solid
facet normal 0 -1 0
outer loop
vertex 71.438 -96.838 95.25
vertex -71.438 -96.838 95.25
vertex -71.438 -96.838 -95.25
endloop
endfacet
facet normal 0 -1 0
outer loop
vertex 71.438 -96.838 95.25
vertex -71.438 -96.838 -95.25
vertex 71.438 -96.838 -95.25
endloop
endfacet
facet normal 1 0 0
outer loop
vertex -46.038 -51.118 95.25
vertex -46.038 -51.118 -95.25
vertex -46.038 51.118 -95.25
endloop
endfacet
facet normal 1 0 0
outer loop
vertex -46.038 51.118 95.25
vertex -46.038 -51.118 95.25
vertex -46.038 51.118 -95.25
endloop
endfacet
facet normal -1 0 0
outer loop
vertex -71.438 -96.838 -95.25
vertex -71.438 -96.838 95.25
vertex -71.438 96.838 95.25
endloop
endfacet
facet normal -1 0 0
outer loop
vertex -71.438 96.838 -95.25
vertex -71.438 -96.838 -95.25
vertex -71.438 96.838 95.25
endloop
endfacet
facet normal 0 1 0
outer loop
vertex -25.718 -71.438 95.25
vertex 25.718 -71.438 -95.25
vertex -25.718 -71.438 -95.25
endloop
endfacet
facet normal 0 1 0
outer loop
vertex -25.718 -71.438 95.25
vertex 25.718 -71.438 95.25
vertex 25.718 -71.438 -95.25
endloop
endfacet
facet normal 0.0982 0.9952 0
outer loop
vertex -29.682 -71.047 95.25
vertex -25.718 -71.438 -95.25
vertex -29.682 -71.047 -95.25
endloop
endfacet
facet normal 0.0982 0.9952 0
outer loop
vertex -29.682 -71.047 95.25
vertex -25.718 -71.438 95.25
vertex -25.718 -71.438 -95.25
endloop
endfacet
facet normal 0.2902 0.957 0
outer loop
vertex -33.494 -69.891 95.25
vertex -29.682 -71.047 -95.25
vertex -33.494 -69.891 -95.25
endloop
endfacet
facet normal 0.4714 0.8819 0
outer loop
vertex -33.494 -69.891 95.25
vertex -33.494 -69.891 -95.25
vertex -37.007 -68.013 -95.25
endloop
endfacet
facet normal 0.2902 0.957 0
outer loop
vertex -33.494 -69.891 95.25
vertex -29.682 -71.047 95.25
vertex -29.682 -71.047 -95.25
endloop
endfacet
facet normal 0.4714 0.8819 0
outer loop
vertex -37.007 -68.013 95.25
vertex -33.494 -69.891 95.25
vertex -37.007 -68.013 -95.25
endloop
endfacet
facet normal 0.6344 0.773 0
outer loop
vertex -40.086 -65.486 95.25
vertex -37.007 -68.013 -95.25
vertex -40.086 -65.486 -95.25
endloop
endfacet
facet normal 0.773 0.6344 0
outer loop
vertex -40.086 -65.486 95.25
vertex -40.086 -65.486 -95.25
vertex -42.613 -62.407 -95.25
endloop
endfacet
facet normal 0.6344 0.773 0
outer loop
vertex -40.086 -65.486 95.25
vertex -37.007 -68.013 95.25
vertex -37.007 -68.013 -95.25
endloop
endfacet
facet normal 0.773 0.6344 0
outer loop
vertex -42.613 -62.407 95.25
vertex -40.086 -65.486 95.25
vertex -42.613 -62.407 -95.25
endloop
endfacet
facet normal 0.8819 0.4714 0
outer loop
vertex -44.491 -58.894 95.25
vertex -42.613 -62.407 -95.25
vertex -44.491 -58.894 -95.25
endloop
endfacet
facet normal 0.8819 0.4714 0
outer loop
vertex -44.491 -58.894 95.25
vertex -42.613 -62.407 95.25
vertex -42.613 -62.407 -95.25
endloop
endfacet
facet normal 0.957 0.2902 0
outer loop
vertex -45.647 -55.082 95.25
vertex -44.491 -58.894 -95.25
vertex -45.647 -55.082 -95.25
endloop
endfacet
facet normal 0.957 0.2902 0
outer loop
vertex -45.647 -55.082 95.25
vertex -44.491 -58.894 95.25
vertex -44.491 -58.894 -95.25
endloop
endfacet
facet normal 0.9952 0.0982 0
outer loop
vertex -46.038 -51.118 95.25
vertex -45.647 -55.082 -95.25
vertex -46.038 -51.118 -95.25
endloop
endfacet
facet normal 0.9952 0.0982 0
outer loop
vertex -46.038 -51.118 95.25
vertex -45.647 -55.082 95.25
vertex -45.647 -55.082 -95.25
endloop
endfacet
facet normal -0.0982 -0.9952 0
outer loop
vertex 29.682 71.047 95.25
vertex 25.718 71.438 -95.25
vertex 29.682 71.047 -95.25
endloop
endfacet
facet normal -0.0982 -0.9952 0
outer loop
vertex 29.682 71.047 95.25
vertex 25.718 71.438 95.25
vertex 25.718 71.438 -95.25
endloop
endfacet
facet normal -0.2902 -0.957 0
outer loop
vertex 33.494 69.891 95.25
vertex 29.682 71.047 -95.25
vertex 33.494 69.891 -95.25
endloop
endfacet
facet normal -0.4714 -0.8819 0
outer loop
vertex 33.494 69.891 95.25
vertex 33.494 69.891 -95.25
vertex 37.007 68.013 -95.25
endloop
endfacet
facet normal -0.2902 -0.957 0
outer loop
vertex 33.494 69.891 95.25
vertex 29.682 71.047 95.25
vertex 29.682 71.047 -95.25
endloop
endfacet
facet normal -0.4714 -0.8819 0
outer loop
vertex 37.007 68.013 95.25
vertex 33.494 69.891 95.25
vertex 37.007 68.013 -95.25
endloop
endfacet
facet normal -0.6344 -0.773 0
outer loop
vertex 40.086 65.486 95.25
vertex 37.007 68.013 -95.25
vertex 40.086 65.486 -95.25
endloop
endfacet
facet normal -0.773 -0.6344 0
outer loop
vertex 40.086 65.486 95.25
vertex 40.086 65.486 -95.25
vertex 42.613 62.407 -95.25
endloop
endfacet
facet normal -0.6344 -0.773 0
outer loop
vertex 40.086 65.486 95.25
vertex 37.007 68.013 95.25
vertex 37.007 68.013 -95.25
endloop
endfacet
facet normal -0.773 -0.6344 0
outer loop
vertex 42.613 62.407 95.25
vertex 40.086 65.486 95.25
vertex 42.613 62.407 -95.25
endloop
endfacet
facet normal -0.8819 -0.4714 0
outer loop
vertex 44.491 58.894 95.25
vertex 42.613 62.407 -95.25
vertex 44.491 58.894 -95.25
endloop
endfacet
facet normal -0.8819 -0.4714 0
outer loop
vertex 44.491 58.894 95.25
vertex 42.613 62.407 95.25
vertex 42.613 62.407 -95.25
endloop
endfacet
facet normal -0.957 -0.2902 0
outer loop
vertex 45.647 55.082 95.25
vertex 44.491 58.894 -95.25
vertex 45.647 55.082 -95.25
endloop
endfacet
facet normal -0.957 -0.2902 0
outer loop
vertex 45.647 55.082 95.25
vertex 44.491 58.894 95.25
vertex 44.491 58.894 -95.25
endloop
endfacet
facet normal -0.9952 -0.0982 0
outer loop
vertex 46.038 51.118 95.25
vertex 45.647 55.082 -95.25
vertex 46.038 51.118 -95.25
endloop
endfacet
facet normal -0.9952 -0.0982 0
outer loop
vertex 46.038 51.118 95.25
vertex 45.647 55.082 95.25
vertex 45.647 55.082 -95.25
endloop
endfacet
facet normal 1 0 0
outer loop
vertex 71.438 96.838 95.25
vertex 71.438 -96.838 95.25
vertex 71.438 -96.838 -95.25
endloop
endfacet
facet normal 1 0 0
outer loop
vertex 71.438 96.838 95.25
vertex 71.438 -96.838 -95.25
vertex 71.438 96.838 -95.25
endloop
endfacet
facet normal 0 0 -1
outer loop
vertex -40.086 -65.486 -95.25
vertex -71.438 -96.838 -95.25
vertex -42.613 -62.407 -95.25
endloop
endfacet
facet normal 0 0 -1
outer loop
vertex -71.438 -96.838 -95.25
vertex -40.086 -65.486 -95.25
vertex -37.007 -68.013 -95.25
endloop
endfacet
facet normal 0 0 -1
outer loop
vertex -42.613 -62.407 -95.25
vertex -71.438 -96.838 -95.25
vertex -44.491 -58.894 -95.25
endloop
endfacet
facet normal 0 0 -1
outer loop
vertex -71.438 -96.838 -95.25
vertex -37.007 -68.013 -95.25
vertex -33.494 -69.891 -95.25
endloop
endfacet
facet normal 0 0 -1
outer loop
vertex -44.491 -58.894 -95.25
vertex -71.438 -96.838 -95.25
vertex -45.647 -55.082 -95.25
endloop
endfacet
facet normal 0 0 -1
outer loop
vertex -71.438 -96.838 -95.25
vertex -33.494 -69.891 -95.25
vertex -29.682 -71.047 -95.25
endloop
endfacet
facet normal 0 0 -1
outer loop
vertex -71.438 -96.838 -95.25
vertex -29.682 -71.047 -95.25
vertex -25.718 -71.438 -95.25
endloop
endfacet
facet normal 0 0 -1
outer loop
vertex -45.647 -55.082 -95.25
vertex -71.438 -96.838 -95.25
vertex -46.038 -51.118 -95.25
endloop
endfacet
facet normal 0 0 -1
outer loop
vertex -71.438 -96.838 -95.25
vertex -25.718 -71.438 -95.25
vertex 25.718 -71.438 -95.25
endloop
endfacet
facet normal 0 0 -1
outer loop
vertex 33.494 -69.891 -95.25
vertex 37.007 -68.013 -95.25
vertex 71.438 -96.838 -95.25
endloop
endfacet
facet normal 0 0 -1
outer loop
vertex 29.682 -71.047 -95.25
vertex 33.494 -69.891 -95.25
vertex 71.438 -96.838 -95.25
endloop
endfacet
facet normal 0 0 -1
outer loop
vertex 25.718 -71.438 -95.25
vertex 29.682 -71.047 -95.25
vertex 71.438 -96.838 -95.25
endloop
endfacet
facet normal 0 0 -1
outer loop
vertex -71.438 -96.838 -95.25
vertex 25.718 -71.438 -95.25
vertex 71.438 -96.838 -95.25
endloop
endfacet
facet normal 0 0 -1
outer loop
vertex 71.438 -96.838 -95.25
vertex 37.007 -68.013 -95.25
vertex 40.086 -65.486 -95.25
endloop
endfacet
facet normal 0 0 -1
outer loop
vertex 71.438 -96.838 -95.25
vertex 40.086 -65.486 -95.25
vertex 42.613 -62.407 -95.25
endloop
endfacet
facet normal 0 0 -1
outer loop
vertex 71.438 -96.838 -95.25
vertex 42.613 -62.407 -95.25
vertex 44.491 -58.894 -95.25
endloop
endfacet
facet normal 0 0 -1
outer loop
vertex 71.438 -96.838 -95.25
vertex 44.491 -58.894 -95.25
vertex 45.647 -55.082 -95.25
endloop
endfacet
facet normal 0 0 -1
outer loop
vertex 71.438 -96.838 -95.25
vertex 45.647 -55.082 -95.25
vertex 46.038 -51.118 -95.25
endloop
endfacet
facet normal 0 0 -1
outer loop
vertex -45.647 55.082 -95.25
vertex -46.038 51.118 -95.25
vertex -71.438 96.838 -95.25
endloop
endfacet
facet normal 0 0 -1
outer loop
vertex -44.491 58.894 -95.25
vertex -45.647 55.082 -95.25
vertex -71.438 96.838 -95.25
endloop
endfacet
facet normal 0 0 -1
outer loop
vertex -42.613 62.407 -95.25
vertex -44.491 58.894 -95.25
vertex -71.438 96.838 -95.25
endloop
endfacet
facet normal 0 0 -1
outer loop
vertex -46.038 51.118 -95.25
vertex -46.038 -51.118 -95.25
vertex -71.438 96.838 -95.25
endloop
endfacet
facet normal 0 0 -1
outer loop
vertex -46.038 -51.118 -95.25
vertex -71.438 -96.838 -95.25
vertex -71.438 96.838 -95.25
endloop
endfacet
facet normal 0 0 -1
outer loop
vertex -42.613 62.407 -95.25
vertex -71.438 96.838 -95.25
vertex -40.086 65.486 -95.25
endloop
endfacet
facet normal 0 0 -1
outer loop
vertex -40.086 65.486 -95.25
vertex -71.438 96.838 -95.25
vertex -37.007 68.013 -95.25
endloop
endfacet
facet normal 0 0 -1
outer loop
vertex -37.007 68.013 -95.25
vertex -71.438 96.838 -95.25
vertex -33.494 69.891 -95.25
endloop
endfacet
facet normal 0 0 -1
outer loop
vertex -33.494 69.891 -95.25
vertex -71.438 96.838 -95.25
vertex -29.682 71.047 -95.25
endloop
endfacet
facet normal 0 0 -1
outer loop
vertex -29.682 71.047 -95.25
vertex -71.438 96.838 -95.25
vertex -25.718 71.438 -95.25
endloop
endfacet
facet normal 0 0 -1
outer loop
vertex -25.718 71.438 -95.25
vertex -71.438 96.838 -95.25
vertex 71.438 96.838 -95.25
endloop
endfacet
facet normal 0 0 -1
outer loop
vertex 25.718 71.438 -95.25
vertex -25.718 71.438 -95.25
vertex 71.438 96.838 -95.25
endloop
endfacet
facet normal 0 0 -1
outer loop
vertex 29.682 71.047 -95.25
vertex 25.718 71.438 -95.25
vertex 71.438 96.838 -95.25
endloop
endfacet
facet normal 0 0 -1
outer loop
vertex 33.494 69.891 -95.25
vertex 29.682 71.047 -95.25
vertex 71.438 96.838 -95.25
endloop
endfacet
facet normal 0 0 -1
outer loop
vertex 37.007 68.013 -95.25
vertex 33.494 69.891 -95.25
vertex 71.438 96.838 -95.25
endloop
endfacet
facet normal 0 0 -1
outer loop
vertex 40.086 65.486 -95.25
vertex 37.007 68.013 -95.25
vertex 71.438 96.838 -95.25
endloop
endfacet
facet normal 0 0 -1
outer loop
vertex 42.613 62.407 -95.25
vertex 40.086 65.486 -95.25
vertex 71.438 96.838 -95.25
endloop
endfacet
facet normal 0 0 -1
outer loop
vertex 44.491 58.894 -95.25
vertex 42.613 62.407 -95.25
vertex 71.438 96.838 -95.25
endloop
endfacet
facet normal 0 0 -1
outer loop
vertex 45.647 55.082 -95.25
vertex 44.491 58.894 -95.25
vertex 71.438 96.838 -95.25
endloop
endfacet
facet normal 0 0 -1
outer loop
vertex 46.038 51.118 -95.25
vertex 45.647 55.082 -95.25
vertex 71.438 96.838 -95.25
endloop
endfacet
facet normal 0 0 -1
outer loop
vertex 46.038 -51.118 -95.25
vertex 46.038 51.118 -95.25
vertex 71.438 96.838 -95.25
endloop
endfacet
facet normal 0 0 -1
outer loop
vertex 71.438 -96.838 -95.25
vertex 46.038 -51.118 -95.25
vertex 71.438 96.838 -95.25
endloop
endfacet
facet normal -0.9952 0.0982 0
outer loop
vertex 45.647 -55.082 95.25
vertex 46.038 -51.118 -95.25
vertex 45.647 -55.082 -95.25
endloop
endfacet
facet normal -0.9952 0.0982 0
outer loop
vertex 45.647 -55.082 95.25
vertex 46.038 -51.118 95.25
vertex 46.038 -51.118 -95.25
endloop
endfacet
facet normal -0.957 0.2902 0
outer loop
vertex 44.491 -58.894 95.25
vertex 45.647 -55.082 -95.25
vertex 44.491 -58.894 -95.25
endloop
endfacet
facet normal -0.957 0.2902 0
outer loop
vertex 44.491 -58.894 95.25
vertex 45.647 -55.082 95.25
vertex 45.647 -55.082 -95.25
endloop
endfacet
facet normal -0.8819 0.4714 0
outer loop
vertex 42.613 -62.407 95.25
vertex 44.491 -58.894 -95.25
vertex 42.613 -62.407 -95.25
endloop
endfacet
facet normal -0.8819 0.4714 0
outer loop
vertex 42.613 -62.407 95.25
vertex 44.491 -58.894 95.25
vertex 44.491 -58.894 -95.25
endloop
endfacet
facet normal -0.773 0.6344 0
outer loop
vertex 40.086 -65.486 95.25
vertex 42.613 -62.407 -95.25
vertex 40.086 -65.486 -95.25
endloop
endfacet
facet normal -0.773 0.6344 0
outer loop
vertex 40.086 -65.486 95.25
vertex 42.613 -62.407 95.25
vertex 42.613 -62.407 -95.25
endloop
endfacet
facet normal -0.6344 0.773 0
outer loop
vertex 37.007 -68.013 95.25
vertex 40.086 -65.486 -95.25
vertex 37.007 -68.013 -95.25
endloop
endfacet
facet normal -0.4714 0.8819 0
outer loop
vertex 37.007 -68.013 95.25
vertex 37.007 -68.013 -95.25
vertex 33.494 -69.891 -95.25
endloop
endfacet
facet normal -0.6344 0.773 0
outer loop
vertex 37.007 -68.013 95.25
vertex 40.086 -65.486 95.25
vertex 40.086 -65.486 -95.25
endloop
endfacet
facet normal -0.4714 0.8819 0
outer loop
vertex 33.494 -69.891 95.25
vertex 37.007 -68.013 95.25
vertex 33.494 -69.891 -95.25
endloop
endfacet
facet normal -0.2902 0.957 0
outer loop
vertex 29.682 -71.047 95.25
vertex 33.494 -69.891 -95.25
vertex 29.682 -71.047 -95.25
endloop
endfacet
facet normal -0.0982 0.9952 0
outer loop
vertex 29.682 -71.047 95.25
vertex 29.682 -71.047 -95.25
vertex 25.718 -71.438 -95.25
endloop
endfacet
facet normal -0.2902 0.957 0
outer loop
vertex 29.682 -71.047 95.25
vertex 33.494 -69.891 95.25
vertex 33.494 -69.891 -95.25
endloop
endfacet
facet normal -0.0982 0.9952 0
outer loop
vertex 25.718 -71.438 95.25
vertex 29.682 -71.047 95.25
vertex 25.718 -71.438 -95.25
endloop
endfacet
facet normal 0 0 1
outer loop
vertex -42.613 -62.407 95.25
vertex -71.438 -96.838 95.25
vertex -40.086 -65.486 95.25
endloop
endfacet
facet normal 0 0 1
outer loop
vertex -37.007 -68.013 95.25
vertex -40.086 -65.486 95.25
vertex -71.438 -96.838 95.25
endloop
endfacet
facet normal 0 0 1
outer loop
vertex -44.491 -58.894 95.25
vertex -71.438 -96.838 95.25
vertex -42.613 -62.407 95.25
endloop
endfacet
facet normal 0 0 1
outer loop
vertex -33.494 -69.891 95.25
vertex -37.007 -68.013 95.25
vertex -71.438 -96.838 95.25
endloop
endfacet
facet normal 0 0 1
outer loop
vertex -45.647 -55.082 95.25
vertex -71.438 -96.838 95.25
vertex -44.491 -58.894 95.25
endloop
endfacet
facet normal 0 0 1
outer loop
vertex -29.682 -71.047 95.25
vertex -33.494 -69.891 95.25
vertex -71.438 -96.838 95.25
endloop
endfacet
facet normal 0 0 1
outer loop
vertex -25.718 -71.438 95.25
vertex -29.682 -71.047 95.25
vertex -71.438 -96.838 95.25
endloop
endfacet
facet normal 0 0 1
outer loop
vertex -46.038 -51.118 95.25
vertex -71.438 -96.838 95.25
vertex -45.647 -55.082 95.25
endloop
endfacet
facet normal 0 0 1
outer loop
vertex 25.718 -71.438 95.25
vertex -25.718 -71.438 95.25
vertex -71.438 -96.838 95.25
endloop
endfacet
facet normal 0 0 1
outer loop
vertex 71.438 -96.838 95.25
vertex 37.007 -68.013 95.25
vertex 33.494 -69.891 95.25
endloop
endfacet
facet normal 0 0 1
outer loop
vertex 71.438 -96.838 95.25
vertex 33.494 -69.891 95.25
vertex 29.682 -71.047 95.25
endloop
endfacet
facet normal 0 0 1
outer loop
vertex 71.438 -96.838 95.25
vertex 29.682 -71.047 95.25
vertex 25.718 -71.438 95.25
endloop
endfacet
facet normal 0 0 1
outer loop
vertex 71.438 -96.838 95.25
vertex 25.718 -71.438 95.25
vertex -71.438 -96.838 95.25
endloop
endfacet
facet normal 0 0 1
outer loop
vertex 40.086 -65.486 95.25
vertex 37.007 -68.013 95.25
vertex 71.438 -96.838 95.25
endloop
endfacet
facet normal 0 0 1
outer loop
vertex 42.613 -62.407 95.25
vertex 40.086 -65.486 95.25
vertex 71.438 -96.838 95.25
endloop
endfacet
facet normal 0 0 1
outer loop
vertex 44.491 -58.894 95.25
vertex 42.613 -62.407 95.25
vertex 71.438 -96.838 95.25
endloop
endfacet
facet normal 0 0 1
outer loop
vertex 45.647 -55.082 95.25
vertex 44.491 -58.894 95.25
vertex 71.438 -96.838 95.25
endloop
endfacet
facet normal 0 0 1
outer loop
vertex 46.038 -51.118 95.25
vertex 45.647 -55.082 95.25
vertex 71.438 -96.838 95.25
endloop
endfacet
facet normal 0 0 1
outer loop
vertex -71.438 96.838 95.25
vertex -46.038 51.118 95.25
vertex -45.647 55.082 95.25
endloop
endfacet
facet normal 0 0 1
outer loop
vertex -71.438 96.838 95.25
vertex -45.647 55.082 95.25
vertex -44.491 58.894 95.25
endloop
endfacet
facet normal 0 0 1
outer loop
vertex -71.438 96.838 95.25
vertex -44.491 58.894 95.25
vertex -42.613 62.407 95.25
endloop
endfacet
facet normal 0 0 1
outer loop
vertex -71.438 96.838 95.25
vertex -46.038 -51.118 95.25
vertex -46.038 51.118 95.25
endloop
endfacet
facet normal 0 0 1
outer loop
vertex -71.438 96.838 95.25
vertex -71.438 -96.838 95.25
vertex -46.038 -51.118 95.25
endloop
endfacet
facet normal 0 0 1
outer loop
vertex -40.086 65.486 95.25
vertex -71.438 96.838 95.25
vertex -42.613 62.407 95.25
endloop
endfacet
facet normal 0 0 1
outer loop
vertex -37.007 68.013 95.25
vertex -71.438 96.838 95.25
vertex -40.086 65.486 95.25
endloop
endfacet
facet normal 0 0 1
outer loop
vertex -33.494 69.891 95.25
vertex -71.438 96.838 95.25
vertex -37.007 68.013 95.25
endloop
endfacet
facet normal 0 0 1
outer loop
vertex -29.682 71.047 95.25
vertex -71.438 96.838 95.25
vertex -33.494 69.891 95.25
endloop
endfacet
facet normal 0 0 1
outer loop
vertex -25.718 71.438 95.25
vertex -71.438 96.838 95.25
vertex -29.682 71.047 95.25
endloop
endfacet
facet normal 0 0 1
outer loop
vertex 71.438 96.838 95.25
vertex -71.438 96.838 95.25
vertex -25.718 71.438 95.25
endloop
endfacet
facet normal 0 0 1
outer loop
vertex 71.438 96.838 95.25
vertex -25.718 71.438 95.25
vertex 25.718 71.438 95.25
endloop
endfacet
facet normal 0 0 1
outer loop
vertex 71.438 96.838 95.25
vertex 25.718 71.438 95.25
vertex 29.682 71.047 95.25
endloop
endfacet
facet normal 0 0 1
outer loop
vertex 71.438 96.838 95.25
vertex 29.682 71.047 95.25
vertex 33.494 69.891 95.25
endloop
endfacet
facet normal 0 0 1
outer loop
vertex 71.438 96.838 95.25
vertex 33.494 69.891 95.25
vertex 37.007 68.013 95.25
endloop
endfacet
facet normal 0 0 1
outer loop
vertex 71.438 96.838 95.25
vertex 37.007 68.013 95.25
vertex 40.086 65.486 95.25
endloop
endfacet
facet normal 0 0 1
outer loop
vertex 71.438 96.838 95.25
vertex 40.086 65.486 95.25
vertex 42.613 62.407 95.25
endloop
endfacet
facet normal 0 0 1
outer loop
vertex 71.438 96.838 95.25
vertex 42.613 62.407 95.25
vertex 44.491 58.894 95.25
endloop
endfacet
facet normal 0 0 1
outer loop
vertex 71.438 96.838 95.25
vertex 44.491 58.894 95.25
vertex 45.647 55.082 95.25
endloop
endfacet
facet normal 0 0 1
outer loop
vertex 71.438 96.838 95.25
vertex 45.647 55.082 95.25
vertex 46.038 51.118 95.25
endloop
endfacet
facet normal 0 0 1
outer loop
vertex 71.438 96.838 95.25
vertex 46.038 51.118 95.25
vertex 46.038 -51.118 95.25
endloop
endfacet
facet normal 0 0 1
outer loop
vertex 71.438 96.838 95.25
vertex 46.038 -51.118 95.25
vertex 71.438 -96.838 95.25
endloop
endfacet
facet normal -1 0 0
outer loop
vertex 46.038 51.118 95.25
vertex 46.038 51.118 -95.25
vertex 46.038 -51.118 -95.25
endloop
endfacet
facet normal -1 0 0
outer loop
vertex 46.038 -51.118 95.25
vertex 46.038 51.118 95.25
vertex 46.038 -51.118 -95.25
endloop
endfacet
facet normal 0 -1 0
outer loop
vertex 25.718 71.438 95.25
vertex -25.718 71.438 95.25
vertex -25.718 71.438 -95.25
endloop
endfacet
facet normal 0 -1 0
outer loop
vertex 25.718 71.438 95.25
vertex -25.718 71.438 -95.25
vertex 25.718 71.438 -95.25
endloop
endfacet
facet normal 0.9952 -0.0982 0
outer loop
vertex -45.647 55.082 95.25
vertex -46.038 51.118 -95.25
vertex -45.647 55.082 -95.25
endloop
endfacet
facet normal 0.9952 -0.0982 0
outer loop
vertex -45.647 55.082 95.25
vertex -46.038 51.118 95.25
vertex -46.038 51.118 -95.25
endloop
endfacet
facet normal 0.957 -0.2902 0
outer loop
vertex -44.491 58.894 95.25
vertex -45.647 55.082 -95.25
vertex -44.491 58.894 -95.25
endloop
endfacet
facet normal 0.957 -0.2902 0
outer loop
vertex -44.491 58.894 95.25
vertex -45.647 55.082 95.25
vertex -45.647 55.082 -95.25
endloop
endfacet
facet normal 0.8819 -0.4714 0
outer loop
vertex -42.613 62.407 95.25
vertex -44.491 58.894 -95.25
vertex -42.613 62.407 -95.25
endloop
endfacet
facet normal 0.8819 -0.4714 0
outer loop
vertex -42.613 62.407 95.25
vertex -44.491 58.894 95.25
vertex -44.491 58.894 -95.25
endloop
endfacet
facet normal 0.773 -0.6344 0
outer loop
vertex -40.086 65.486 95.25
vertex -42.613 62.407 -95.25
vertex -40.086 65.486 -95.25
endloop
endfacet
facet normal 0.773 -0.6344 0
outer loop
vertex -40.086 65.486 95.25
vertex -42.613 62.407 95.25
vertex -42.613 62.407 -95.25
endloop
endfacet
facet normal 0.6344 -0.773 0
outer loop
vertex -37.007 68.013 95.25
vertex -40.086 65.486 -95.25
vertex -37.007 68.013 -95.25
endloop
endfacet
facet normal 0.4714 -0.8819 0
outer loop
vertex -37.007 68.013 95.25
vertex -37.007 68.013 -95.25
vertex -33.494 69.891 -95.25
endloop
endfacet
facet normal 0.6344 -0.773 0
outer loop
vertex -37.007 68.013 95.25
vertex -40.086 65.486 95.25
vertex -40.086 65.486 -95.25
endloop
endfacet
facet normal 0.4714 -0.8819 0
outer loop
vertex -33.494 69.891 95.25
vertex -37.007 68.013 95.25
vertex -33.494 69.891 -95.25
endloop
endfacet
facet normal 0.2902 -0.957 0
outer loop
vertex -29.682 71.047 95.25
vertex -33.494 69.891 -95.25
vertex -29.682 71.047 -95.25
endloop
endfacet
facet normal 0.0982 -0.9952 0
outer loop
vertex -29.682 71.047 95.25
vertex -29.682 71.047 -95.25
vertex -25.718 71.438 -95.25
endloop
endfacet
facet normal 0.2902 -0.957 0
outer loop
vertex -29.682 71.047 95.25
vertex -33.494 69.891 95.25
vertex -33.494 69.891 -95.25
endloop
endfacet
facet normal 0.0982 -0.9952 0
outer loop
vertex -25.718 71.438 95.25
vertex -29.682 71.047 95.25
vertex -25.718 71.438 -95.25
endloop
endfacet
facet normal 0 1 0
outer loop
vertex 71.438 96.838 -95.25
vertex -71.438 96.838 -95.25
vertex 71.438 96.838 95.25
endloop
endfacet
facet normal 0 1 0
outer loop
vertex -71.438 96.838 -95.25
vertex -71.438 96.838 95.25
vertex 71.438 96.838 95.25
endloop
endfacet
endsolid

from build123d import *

# Parameters (mm, degrees)
F0_W     = 142.875
F0_H     = 193.675
F1_DEPTH = 95.25


with BuildPart() as f1:
    # F0 (on Top) → F1 (new body, symmetric)
    with BuildSketch(Plane.XY):
        Rectangle(F0_W, F0_H)
        with BuildLine():
            Line((-25.7175, 71.4375), (25.7175, 71.4375))
            ThreePointArc((25.7175, 71.4375), (40.08591, 65.48591), (46.0375, 51.1175))
            Line((46.0375, 51.1175), (46.0375, 0))
            Line((46.0375, 0), (46.0375, -51.1175))
            ThreePointArc((46.0375, -51.1175), (40.08591, -65.48591), (25.7175, -71.4375))
            Line((25.7175, -71.4375), (-25.7175, -71.4375))
            ThreePointArc((-25.7175, -71.4375), (-40.08591, -65.48591), (-46.0375, -51.1175))
            Line((-46.0375, -51.1175), (-46.0375, 0))
            Line((-46.0375, 0), (-46.0375, 51.1175))
            ThreePointArc((-46.0375, 51.1175), (-40.08591, 65.48591), (-25.7175, 71.4375))
        make_face(mode=Mode.SUBTRACT)
    extrude(amount=F1_DEPTH, both=True)


solid = f1.part
